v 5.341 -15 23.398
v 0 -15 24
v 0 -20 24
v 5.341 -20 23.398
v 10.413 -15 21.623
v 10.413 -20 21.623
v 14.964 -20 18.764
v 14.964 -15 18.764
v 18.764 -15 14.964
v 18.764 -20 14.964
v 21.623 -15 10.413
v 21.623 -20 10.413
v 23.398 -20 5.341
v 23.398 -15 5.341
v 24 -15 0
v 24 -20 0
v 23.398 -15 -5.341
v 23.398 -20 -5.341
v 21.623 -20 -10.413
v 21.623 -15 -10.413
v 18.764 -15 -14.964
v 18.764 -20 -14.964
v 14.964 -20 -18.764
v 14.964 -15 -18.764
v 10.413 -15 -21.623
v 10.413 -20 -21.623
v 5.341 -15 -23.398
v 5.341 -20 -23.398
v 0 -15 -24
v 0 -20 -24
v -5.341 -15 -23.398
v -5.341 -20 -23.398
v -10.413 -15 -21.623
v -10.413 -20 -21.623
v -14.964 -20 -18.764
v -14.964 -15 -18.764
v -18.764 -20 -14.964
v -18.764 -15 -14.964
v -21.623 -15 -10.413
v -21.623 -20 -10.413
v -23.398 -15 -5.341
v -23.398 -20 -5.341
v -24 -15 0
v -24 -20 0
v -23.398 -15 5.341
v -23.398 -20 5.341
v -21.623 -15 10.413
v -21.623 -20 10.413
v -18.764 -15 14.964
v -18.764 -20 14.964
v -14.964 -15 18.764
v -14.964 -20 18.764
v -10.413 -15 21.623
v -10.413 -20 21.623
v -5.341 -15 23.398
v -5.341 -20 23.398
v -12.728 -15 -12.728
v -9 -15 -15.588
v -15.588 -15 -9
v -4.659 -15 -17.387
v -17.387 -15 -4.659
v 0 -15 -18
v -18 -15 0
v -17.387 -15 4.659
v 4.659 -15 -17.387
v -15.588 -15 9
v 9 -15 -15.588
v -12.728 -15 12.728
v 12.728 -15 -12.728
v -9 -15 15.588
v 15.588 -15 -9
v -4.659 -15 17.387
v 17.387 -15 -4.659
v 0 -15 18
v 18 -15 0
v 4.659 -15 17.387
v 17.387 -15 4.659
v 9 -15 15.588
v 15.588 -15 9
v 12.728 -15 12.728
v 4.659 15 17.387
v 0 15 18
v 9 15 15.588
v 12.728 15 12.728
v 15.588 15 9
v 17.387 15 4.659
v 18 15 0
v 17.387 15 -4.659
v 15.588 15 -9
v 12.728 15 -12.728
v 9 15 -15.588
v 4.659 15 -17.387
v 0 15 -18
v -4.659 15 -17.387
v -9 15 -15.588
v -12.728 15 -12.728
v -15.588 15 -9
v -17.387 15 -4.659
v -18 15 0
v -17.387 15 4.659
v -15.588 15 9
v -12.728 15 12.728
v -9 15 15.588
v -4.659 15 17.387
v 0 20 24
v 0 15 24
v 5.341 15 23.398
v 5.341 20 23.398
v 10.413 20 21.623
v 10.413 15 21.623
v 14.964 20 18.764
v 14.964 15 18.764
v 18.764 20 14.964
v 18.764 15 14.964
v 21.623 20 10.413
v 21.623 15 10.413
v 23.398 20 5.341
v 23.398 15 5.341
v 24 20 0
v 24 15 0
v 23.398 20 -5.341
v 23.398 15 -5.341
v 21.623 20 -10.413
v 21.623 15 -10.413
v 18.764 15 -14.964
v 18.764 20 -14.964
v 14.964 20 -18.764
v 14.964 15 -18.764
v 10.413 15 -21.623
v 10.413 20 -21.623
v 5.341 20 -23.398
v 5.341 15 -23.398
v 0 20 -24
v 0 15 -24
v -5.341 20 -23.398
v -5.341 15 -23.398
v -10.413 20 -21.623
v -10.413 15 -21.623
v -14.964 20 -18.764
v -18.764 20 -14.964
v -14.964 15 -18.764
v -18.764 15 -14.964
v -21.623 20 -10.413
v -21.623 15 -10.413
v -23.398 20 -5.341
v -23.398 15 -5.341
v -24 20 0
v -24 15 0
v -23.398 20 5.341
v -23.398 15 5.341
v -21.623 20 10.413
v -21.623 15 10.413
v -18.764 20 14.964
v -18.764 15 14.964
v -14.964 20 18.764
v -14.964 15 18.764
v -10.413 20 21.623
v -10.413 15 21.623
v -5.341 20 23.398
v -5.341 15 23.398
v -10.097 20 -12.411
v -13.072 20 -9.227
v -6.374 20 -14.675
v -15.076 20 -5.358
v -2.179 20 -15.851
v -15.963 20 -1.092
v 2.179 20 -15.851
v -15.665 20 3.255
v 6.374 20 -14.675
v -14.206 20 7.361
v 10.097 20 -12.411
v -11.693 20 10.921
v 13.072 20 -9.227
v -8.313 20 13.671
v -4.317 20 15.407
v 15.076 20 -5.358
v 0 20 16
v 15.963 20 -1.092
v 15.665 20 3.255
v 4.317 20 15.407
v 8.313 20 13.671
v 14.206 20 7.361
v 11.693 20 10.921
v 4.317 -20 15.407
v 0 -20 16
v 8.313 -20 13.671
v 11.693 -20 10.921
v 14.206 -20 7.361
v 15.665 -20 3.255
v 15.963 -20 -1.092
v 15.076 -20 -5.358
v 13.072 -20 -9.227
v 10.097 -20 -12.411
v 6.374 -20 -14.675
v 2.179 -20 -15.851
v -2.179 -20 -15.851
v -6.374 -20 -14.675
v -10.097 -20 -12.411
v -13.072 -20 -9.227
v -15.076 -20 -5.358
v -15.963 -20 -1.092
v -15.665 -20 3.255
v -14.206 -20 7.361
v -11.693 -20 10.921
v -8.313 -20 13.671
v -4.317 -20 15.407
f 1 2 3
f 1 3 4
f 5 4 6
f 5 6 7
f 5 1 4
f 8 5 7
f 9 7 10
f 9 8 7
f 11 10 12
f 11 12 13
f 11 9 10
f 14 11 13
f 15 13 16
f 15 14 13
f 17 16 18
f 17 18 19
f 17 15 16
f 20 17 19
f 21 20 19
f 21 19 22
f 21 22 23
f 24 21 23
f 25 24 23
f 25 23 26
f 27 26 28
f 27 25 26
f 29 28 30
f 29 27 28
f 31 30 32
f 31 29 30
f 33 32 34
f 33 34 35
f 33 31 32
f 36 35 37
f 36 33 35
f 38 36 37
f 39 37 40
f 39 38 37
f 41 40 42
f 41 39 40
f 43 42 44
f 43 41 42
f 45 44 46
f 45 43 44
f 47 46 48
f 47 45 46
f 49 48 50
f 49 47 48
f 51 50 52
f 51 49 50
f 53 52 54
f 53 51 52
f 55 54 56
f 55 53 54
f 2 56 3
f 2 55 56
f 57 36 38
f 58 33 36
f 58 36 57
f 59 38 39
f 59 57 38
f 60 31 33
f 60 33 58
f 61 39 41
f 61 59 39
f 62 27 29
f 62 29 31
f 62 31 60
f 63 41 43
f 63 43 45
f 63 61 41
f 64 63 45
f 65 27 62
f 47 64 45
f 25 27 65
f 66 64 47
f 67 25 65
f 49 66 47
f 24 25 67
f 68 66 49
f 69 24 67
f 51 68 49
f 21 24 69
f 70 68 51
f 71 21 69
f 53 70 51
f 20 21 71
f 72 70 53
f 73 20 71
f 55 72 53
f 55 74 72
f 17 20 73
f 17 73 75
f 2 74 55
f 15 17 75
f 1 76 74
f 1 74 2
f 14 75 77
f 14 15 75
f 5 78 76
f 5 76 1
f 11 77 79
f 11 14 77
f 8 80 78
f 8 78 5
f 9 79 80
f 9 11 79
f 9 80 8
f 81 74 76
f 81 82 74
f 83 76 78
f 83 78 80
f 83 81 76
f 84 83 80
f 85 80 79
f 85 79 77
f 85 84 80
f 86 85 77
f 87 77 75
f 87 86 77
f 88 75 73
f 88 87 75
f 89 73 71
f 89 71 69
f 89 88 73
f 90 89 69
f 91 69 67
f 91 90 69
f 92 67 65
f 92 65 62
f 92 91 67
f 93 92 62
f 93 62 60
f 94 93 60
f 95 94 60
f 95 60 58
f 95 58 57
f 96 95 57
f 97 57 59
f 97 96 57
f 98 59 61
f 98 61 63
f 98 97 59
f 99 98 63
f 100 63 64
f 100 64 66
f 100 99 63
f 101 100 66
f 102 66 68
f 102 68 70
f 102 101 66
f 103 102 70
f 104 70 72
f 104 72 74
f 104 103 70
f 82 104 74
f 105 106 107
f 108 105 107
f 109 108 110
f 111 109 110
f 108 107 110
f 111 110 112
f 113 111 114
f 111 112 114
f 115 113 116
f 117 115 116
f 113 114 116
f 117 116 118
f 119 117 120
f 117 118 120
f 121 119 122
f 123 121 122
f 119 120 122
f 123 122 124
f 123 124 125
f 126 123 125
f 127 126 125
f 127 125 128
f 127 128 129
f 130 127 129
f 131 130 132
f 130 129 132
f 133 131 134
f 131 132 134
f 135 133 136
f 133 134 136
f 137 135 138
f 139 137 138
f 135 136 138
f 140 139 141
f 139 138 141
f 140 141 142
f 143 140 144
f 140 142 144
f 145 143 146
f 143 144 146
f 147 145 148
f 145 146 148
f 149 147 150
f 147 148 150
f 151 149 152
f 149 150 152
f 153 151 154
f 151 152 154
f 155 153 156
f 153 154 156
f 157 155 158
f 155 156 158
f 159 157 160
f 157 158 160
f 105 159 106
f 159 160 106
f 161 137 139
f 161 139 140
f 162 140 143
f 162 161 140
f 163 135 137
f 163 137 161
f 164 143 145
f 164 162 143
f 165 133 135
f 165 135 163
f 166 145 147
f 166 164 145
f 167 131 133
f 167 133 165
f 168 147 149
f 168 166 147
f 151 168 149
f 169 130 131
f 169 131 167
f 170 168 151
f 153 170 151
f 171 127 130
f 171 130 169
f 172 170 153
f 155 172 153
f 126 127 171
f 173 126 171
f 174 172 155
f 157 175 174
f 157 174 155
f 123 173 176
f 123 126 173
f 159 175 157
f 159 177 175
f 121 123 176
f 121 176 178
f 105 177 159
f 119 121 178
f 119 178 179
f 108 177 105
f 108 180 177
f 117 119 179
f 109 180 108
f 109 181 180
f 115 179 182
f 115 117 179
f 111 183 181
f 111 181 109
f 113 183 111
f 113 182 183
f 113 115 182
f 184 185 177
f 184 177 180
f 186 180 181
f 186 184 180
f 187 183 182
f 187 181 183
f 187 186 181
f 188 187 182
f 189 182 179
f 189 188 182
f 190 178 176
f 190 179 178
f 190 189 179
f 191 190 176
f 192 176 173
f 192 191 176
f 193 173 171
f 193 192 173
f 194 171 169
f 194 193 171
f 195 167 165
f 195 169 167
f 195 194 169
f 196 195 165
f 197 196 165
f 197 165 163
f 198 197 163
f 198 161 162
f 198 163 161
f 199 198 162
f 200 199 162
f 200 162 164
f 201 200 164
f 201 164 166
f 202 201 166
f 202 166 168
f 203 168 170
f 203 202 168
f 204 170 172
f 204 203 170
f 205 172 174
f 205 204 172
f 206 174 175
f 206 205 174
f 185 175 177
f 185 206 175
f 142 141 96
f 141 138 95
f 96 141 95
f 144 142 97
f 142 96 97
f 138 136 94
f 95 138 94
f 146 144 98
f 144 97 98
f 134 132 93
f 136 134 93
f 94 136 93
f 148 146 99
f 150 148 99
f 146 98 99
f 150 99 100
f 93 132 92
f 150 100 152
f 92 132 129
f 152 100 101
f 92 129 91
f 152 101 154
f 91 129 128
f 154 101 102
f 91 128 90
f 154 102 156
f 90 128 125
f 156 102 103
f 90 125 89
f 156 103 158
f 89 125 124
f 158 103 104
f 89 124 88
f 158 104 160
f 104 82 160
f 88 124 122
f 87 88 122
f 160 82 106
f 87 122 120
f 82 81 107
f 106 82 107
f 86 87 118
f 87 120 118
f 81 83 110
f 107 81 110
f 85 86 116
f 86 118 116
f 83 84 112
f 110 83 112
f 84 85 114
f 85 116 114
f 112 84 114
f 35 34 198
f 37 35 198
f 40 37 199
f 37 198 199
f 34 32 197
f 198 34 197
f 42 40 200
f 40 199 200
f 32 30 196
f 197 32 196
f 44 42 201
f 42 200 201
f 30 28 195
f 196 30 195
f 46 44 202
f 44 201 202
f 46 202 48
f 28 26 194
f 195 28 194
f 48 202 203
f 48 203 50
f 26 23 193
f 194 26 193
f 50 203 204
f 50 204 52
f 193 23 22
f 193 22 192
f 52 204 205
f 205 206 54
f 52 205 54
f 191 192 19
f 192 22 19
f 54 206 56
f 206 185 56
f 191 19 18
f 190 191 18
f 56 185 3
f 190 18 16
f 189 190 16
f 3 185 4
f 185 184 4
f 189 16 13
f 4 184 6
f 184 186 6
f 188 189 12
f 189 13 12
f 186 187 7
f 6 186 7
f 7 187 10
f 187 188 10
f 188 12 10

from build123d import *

# Parameters (mm, degrees)
SKETCH1_R           = 18
EXTRUDE1_DEPTH      = 15
SKETCH2_R           = 24
EXTRUDE2_DEPTH      = 5
EXTRUDE4_DEPTH      = 40.395431207
EXTRUDE4_DEPTH_BACK = 40.395431207
SKETCH3_R           = 16


with BuildPart() as part:
    # Sketch1 → Extrude1 (new, symmetric)
    with BuildSketch(Plane(origin=(0, 0, 0), x_dir=(1, 0, 0), z_dir=(0, 1, 0))):
        with Locations(Location((0, 0, 0), (0, 0, 270))):
            Circle(SKETCH1_R)
    extrude(amount=EXTRUDE1_DEPTH, both=True)

    # Sketch2 → Extrude2 (add)
    with BuildSketch(Plane(origin=(0, 15, 0), x_dir=(1, 0, 0), z_dir=(0, 1, 0))):
        with Locations(Location((0, 0, 0), (0, 0, 270))):
            Circle(SKETCH2_R)
    extrude2 = extrude(amount=EXTRUDE2_DEPTH)

    # Mirror1: Extrude2 across plane
    add(extrude2.mirror(Plane.ZX))

    # Sketch3 → Extrude4 (cut, two sides: drawn at the far end of the back side and taken through both)
    with BuildSketch(Plane(origin=(0, 0, 0), x_dir=(1, 0, 0), z_dir=(0, 1, 0)).offset(-EXTRUDE4_DEPTH_BACK)):
        with Locations(Location((0, 0, 0), (0, 0, 270))):
            Circle(SKETCH3_R)
    extrude(amount=EXTRUDE4_DEPTH + EXTRUDE4_DEPTH_BACK, mode=Mode.SUBTRACT)


solid = part.part
